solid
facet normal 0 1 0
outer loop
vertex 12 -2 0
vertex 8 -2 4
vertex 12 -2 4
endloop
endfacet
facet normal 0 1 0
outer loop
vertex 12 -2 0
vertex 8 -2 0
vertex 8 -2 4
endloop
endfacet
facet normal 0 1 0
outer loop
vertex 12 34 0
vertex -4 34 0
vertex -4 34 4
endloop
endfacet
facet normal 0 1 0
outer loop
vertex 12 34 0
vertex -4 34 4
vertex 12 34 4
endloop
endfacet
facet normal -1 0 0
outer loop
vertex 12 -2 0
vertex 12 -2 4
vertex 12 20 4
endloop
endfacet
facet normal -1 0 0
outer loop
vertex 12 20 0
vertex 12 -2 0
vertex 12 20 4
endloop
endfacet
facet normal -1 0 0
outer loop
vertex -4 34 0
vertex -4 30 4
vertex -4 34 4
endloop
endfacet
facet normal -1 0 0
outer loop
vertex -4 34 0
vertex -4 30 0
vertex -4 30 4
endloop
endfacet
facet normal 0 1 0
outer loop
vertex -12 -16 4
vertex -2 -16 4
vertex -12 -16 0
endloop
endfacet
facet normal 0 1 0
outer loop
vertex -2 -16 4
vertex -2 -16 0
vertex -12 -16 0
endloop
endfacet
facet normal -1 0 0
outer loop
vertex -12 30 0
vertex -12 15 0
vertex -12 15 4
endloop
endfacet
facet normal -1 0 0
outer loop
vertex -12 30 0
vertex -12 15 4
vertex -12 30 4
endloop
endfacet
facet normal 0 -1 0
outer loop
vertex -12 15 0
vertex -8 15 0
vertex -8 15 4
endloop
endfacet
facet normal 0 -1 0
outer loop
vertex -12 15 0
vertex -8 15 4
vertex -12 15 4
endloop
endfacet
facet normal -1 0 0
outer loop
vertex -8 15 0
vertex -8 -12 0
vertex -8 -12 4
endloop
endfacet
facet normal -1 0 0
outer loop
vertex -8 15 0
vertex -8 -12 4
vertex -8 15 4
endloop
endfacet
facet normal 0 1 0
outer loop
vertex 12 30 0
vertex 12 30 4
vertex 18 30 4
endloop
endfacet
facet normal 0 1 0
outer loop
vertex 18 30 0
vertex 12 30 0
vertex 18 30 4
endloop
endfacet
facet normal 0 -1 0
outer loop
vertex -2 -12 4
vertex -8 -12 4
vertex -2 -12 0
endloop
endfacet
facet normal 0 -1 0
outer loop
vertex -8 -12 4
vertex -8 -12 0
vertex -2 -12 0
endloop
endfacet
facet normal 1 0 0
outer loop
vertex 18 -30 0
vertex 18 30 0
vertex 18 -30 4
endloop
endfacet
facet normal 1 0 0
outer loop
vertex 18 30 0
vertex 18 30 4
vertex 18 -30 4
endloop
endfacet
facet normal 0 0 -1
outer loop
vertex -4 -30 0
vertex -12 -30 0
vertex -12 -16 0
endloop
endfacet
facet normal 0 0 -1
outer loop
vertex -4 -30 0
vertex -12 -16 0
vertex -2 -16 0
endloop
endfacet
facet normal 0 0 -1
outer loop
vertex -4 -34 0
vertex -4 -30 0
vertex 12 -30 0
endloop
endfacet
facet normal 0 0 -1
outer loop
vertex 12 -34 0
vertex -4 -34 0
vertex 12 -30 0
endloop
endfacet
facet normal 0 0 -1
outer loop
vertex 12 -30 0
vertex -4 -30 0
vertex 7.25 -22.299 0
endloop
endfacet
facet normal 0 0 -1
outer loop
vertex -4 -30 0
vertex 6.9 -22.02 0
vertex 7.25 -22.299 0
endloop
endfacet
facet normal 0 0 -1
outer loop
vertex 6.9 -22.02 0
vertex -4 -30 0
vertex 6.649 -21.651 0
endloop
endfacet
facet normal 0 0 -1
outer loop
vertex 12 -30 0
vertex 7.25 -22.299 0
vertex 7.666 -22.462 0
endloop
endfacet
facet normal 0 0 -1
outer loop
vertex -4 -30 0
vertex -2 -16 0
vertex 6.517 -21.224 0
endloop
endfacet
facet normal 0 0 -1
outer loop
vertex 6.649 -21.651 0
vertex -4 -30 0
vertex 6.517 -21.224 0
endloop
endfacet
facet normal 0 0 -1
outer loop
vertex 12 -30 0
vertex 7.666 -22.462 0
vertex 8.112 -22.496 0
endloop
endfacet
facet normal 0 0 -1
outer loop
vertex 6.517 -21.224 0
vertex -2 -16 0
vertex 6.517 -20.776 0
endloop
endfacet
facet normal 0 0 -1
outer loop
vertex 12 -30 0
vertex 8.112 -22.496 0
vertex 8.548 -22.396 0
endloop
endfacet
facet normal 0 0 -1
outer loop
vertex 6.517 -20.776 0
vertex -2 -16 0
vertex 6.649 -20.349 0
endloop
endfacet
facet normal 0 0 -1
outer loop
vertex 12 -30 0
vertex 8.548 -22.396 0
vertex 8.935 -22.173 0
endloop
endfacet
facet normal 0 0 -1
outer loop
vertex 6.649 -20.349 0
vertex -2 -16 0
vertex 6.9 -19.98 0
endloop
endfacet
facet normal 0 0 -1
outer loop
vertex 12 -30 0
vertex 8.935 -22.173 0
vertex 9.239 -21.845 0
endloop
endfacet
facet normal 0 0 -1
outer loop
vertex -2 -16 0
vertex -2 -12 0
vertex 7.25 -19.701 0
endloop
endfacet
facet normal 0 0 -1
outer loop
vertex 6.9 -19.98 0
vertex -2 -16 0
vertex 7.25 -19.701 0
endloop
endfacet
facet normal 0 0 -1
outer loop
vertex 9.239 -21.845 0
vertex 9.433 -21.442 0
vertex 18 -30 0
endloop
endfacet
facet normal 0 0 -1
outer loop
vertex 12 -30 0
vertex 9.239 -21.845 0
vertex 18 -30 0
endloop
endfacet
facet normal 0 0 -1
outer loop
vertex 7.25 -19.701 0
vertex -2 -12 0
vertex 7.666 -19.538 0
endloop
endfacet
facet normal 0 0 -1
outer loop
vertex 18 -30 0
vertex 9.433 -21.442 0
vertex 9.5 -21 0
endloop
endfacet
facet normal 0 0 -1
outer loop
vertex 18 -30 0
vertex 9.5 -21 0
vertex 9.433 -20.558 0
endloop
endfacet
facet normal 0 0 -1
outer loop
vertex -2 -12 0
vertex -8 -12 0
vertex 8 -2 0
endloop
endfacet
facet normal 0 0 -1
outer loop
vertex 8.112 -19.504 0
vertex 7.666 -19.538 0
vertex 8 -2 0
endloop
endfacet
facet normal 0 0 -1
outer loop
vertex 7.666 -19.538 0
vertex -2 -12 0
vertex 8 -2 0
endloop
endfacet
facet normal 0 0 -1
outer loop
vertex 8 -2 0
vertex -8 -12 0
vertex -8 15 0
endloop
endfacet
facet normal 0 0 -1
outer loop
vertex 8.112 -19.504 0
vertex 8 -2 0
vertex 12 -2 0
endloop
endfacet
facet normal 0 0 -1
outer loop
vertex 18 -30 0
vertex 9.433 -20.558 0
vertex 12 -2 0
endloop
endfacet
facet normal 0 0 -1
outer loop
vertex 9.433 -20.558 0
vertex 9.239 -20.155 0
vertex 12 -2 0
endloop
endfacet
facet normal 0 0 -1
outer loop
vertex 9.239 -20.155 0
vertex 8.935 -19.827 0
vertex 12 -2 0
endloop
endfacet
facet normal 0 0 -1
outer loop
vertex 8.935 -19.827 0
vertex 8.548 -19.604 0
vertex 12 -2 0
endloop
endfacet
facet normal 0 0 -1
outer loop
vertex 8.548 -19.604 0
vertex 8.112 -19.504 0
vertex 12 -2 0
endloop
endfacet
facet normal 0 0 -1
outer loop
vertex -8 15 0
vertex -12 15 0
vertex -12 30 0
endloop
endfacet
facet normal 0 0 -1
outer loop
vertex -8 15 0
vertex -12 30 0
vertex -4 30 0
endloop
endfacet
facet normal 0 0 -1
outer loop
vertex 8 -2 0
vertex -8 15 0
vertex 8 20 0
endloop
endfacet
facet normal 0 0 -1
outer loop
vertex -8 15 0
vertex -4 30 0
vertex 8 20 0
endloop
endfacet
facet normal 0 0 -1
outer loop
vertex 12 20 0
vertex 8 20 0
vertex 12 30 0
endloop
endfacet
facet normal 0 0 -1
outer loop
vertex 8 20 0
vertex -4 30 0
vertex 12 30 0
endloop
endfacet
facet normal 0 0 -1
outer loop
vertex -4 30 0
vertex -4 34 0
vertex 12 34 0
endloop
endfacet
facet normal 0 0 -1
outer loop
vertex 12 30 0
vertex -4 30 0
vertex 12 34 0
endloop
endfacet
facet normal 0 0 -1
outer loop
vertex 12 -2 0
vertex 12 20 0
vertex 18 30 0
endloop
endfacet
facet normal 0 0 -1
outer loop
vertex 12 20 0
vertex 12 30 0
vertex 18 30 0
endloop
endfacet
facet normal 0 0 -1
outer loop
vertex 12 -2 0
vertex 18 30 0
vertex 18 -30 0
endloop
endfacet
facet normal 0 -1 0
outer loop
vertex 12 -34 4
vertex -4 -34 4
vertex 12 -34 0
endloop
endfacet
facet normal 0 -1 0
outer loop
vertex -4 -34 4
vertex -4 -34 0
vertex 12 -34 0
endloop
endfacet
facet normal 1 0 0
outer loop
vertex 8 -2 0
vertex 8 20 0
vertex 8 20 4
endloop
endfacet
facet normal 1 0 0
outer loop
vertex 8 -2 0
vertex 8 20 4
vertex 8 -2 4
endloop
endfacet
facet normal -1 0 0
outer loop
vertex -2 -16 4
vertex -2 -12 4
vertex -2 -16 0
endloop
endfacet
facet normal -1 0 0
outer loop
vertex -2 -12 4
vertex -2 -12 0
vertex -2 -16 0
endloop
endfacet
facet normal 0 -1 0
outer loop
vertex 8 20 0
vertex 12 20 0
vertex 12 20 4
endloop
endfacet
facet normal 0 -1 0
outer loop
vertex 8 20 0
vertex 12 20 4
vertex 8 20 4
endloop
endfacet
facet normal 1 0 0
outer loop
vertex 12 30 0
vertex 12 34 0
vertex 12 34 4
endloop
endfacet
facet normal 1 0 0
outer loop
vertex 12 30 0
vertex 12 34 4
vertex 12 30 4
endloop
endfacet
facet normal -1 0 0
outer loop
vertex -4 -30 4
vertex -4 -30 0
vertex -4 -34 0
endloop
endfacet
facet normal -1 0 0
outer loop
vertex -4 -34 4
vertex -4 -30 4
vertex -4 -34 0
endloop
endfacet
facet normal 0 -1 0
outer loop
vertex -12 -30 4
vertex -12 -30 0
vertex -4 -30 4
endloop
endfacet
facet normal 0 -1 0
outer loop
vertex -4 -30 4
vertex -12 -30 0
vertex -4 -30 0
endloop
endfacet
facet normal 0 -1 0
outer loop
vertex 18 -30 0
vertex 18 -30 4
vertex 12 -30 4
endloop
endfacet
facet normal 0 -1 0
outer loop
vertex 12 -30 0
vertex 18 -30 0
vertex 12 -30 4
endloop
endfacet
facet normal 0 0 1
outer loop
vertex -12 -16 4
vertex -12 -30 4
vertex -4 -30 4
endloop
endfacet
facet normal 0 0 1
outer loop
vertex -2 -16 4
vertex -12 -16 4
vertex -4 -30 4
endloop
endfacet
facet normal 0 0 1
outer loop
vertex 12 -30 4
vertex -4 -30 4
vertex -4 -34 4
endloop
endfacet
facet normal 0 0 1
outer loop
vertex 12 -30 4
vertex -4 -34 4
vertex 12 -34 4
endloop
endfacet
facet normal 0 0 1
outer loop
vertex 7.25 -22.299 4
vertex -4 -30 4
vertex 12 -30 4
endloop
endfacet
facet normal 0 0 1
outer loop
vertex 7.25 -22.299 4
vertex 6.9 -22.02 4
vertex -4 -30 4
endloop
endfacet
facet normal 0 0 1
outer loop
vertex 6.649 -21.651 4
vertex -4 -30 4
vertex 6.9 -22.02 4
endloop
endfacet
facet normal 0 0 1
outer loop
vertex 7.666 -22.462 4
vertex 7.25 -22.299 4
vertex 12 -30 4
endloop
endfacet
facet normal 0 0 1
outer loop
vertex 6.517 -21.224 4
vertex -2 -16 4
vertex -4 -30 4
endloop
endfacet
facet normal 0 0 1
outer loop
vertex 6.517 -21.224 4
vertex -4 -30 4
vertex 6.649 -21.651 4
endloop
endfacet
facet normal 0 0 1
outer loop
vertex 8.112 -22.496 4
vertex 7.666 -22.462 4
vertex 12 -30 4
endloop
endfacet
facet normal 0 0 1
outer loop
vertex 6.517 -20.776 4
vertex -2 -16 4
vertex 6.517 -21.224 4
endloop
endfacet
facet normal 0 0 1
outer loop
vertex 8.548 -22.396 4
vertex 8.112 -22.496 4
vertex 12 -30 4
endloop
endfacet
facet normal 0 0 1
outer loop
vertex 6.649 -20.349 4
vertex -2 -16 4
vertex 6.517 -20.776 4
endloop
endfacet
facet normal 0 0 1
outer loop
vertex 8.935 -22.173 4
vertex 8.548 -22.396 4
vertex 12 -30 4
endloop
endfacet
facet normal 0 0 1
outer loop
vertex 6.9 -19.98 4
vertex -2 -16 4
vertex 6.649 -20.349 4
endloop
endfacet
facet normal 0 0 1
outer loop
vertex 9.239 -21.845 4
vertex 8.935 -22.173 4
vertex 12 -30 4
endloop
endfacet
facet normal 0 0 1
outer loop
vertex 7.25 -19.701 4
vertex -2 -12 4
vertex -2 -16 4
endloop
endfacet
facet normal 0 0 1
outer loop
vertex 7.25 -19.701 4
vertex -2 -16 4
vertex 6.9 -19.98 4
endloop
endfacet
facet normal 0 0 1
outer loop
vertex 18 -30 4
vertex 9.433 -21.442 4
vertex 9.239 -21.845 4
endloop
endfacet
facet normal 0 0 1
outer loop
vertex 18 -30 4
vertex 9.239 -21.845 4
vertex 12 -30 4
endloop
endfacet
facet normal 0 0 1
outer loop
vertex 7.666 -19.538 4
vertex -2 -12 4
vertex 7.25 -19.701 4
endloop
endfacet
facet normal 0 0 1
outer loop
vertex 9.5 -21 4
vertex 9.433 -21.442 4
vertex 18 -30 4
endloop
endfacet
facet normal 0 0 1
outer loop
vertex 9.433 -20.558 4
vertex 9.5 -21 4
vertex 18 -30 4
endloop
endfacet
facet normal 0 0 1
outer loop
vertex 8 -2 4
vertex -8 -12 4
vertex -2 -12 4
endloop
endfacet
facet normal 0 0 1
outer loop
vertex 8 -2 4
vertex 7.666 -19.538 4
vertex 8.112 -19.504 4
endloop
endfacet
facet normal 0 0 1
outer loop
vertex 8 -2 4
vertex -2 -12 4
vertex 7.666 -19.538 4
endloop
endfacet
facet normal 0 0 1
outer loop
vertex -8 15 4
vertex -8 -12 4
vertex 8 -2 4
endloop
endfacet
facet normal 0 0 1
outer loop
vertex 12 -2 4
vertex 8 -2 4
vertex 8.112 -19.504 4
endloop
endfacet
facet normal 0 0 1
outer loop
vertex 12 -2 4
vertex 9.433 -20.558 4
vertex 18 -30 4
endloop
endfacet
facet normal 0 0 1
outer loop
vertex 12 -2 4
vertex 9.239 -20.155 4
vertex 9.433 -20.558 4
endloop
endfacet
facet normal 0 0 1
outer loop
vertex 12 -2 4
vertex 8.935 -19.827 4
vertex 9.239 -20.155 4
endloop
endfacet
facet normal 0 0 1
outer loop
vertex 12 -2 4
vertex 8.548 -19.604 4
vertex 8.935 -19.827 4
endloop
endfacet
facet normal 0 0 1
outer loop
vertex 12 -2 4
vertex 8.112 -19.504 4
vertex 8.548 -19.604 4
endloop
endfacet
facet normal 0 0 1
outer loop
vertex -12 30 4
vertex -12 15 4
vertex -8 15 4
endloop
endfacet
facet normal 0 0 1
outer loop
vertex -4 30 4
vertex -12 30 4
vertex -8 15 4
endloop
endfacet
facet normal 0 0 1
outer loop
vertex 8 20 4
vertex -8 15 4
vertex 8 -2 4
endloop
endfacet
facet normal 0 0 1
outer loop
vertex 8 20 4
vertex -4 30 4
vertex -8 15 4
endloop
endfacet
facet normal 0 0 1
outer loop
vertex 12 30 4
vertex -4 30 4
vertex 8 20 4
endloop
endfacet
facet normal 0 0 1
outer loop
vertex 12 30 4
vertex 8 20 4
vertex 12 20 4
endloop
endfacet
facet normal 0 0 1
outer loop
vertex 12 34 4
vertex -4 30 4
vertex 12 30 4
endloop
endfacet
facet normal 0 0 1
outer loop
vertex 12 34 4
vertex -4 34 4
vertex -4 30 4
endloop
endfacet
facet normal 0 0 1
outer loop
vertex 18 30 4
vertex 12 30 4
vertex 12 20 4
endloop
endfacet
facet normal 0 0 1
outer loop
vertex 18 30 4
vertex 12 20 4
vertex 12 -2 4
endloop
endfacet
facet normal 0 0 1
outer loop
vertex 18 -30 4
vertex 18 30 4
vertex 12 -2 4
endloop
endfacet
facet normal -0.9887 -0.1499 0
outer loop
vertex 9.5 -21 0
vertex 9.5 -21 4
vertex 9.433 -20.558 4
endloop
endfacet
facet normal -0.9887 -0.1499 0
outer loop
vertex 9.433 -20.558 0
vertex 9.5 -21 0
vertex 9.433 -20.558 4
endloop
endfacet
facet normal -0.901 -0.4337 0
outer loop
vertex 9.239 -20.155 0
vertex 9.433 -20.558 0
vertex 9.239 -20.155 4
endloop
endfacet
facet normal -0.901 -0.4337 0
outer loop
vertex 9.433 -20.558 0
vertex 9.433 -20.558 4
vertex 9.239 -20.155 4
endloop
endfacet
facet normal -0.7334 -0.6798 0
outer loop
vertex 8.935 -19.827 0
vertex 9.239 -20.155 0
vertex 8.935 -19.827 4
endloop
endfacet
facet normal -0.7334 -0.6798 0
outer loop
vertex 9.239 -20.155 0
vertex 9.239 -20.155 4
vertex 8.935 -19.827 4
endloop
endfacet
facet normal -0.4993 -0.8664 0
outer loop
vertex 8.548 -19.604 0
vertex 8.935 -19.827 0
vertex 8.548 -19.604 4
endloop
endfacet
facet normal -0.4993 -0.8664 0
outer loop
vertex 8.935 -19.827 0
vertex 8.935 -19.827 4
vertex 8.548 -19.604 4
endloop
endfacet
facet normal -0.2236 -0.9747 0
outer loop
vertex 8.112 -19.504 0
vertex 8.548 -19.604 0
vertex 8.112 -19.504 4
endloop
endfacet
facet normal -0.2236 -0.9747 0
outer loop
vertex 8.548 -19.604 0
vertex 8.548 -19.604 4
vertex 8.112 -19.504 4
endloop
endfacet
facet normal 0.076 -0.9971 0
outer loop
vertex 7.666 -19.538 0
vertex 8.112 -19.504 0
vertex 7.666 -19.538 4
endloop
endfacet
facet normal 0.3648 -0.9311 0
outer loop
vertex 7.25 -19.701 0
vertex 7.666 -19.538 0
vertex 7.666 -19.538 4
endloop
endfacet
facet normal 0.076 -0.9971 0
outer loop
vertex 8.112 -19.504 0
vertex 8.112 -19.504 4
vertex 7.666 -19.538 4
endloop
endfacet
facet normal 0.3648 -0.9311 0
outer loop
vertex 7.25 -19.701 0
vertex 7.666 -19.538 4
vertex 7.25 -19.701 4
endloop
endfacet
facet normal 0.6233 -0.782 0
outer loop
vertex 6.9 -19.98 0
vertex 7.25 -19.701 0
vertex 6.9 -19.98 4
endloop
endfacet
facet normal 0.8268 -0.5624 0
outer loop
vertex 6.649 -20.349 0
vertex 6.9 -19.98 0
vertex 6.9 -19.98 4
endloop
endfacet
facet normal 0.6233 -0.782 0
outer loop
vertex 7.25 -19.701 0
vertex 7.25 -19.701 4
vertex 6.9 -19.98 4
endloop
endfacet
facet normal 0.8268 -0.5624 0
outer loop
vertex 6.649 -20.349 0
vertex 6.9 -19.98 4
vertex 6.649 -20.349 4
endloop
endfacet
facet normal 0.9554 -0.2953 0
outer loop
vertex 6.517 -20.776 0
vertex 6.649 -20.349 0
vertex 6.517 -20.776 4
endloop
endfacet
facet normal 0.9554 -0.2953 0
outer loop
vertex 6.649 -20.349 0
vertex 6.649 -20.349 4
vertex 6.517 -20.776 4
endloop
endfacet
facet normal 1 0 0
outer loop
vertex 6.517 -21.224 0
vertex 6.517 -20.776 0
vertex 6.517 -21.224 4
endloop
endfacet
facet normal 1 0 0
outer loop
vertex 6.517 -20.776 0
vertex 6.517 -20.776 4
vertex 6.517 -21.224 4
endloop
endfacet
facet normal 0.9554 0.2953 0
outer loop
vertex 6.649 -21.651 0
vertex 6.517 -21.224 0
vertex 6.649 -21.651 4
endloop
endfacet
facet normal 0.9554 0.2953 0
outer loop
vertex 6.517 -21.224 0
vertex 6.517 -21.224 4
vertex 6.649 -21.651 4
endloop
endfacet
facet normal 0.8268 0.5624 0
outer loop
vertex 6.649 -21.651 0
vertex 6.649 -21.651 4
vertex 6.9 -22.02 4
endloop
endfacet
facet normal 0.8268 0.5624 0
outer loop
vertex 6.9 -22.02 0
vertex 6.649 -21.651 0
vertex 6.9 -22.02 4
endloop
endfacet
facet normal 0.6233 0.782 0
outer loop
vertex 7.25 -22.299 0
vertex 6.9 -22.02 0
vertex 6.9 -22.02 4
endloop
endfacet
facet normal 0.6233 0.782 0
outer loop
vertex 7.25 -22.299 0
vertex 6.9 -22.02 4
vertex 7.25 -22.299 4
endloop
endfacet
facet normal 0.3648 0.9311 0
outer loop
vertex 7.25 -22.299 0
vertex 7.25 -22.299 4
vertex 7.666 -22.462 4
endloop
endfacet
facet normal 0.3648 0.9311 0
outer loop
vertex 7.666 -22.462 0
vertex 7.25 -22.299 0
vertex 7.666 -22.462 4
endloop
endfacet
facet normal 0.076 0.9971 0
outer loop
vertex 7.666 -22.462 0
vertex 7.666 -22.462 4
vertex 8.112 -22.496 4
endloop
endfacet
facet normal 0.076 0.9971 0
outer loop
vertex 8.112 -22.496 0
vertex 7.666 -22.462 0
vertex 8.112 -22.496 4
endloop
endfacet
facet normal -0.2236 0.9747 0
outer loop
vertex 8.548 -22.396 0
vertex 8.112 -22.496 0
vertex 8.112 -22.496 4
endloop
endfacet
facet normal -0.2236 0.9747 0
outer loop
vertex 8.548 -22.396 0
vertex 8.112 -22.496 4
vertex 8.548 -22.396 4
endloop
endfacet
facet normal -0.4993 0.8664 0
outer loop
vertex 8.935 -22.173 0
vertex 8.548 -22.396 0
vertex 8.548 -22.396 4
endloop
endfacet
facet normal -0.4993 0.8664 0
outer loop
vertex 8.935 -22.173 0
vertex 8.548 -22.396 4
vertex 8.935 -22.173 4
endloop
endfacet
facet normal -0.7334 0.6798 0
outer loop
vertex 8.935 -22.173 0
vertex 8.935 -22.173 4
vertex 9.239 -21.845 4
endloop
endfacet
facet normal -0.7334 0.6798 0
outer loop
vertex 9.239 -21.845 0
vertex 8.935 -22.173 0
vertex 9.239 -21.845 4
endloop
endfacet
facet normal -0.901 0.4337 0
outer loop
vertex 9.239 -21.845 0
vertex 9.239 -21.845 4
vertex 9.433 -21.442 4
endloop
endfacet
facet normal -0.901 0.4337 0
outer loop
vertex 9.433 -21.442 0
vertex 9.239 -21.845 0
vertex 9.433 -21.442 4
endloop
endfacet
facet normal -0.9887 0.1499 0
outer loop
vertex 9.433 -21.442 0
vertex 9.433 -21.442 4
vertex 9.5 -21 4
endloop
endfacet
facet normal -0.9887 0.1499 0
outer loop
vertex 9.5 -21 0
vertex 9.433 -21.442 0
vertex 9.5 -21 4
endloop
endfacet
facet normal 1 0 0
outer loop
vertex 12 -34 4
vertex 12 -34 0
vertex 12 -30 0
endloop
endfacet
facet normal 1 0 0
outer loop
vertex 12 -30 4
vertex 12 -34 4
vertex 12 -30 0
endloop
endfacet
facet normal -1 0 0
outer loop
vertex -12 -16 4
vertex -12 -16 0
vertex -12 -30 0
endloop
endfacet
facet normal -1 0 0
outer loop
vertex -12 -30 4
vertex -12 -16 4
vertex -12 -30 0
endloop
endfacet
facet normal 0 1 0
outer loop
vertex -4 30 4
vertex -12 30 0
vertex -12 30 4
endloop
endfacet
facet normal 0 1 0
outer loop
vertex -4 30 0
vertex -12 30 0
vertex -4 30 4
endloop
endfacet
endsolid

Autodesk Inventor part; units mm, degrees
ref_plane "YZ Plane" through (0, 0, 0) normal (1, 0, 0) x (0, 1, 0)
ref_plane "XZ Plane" through (0, 0, 0) normal (0, 1, 0) x (-1, 0, 0)
ref_plane "XY Plane" through (0, 0, 0) normal (0, 0, 1) x (1, 0, 0)
sketch "Эскиз1" plane through (0, 0, 0) normal (0, 0, 1) x (1, 0, 0)
  line L0 (-12, -16) -> (-12, -30)
  line L1 (-12, -30) -> (-4, -30)
  line L2 (-4, -34) -> (12, -34)
  line L3 (12, -34) -> (12, -2)
  line L4 (-8, 0) -> (8, 0)
  line L5 (-4, -30) -> (-4, -34)
  line L6 (-12, 30) -> (-4, 30)
  line L7 (-4, 34) -> (12, 34)
  line L8 (-4, 30) -> (-4, 34)
  line L9 (12, 34) -> (12, 20)
  line L10 (12, 20) -> (8, 20)
  line L11 (8, 20) -> (8, -2)
  line L12 (8, -2) -> (12, -2)
  line L13 (-8, -12) -> (-8, 15)
  line L14 (-8, 15) -> (-12, 15)
  line L15 (-12, 15) -> (-12, 30)
  line L16 (-8, -12) -> (-2, -12)
  line L17 (-2, -12) -> (-2, -16)
  line L18 (-2, -16) -> (-12, -16)
  point P0 (0, 0)
  point P1 (0, 0)
  dimension "d0" = 16
  dimension "d1" = 8
  dimension "d12" = 60
  dimension "d17" = 22
  dimension "d18" = 14
  dimension "d19" = 27
  dimension "d20" = 10
  dimension "d21" = 4
  dimension "d22" = 15
extrude "Выдавливание1" add sketch "Эскиз1" along normal blind 4
sketch "Эскиз2" plane through (0, 0, 4) normal (0, 0, 1) x (1, 0, 0)
  circle A0 centre (8, -21) radius 1.5
  line L0 (-12, -16) -> (-12, -30) projected
  line L1 (-12, -30) -> (-4, -30) projected
  point P0 (0, 0)
  dimension "d23" = 20
  dimension "d24" = 9
  dimension "d25" = 3
extrude "Выдавливание2" cut sketch "Эскиз2" against normal through all
sketch "Эскиз3" plane through (0, 0, 4) normal (0, 0, 1) x (1, 0, 0)
  line L0 (12, 20) -> (12, 34) projected
  line L1 (12, 30) -> (18, 30)
  line L2 (18, 30) -> (18, -30)
  line L3 (18, -30) -> (12, -30)
  line L4 (12, -30) -> (12, 30)
  point P0 (0, 0)
  point P1 (-4, 30)
  point P2 (-4, -30)
  dimension "d28" = 6
extrude "Выдавливание3" add sketch "Эскиз3" against normal up to surface (4 mm away)
properties part number "batTop" material "Дерево (береза)"
